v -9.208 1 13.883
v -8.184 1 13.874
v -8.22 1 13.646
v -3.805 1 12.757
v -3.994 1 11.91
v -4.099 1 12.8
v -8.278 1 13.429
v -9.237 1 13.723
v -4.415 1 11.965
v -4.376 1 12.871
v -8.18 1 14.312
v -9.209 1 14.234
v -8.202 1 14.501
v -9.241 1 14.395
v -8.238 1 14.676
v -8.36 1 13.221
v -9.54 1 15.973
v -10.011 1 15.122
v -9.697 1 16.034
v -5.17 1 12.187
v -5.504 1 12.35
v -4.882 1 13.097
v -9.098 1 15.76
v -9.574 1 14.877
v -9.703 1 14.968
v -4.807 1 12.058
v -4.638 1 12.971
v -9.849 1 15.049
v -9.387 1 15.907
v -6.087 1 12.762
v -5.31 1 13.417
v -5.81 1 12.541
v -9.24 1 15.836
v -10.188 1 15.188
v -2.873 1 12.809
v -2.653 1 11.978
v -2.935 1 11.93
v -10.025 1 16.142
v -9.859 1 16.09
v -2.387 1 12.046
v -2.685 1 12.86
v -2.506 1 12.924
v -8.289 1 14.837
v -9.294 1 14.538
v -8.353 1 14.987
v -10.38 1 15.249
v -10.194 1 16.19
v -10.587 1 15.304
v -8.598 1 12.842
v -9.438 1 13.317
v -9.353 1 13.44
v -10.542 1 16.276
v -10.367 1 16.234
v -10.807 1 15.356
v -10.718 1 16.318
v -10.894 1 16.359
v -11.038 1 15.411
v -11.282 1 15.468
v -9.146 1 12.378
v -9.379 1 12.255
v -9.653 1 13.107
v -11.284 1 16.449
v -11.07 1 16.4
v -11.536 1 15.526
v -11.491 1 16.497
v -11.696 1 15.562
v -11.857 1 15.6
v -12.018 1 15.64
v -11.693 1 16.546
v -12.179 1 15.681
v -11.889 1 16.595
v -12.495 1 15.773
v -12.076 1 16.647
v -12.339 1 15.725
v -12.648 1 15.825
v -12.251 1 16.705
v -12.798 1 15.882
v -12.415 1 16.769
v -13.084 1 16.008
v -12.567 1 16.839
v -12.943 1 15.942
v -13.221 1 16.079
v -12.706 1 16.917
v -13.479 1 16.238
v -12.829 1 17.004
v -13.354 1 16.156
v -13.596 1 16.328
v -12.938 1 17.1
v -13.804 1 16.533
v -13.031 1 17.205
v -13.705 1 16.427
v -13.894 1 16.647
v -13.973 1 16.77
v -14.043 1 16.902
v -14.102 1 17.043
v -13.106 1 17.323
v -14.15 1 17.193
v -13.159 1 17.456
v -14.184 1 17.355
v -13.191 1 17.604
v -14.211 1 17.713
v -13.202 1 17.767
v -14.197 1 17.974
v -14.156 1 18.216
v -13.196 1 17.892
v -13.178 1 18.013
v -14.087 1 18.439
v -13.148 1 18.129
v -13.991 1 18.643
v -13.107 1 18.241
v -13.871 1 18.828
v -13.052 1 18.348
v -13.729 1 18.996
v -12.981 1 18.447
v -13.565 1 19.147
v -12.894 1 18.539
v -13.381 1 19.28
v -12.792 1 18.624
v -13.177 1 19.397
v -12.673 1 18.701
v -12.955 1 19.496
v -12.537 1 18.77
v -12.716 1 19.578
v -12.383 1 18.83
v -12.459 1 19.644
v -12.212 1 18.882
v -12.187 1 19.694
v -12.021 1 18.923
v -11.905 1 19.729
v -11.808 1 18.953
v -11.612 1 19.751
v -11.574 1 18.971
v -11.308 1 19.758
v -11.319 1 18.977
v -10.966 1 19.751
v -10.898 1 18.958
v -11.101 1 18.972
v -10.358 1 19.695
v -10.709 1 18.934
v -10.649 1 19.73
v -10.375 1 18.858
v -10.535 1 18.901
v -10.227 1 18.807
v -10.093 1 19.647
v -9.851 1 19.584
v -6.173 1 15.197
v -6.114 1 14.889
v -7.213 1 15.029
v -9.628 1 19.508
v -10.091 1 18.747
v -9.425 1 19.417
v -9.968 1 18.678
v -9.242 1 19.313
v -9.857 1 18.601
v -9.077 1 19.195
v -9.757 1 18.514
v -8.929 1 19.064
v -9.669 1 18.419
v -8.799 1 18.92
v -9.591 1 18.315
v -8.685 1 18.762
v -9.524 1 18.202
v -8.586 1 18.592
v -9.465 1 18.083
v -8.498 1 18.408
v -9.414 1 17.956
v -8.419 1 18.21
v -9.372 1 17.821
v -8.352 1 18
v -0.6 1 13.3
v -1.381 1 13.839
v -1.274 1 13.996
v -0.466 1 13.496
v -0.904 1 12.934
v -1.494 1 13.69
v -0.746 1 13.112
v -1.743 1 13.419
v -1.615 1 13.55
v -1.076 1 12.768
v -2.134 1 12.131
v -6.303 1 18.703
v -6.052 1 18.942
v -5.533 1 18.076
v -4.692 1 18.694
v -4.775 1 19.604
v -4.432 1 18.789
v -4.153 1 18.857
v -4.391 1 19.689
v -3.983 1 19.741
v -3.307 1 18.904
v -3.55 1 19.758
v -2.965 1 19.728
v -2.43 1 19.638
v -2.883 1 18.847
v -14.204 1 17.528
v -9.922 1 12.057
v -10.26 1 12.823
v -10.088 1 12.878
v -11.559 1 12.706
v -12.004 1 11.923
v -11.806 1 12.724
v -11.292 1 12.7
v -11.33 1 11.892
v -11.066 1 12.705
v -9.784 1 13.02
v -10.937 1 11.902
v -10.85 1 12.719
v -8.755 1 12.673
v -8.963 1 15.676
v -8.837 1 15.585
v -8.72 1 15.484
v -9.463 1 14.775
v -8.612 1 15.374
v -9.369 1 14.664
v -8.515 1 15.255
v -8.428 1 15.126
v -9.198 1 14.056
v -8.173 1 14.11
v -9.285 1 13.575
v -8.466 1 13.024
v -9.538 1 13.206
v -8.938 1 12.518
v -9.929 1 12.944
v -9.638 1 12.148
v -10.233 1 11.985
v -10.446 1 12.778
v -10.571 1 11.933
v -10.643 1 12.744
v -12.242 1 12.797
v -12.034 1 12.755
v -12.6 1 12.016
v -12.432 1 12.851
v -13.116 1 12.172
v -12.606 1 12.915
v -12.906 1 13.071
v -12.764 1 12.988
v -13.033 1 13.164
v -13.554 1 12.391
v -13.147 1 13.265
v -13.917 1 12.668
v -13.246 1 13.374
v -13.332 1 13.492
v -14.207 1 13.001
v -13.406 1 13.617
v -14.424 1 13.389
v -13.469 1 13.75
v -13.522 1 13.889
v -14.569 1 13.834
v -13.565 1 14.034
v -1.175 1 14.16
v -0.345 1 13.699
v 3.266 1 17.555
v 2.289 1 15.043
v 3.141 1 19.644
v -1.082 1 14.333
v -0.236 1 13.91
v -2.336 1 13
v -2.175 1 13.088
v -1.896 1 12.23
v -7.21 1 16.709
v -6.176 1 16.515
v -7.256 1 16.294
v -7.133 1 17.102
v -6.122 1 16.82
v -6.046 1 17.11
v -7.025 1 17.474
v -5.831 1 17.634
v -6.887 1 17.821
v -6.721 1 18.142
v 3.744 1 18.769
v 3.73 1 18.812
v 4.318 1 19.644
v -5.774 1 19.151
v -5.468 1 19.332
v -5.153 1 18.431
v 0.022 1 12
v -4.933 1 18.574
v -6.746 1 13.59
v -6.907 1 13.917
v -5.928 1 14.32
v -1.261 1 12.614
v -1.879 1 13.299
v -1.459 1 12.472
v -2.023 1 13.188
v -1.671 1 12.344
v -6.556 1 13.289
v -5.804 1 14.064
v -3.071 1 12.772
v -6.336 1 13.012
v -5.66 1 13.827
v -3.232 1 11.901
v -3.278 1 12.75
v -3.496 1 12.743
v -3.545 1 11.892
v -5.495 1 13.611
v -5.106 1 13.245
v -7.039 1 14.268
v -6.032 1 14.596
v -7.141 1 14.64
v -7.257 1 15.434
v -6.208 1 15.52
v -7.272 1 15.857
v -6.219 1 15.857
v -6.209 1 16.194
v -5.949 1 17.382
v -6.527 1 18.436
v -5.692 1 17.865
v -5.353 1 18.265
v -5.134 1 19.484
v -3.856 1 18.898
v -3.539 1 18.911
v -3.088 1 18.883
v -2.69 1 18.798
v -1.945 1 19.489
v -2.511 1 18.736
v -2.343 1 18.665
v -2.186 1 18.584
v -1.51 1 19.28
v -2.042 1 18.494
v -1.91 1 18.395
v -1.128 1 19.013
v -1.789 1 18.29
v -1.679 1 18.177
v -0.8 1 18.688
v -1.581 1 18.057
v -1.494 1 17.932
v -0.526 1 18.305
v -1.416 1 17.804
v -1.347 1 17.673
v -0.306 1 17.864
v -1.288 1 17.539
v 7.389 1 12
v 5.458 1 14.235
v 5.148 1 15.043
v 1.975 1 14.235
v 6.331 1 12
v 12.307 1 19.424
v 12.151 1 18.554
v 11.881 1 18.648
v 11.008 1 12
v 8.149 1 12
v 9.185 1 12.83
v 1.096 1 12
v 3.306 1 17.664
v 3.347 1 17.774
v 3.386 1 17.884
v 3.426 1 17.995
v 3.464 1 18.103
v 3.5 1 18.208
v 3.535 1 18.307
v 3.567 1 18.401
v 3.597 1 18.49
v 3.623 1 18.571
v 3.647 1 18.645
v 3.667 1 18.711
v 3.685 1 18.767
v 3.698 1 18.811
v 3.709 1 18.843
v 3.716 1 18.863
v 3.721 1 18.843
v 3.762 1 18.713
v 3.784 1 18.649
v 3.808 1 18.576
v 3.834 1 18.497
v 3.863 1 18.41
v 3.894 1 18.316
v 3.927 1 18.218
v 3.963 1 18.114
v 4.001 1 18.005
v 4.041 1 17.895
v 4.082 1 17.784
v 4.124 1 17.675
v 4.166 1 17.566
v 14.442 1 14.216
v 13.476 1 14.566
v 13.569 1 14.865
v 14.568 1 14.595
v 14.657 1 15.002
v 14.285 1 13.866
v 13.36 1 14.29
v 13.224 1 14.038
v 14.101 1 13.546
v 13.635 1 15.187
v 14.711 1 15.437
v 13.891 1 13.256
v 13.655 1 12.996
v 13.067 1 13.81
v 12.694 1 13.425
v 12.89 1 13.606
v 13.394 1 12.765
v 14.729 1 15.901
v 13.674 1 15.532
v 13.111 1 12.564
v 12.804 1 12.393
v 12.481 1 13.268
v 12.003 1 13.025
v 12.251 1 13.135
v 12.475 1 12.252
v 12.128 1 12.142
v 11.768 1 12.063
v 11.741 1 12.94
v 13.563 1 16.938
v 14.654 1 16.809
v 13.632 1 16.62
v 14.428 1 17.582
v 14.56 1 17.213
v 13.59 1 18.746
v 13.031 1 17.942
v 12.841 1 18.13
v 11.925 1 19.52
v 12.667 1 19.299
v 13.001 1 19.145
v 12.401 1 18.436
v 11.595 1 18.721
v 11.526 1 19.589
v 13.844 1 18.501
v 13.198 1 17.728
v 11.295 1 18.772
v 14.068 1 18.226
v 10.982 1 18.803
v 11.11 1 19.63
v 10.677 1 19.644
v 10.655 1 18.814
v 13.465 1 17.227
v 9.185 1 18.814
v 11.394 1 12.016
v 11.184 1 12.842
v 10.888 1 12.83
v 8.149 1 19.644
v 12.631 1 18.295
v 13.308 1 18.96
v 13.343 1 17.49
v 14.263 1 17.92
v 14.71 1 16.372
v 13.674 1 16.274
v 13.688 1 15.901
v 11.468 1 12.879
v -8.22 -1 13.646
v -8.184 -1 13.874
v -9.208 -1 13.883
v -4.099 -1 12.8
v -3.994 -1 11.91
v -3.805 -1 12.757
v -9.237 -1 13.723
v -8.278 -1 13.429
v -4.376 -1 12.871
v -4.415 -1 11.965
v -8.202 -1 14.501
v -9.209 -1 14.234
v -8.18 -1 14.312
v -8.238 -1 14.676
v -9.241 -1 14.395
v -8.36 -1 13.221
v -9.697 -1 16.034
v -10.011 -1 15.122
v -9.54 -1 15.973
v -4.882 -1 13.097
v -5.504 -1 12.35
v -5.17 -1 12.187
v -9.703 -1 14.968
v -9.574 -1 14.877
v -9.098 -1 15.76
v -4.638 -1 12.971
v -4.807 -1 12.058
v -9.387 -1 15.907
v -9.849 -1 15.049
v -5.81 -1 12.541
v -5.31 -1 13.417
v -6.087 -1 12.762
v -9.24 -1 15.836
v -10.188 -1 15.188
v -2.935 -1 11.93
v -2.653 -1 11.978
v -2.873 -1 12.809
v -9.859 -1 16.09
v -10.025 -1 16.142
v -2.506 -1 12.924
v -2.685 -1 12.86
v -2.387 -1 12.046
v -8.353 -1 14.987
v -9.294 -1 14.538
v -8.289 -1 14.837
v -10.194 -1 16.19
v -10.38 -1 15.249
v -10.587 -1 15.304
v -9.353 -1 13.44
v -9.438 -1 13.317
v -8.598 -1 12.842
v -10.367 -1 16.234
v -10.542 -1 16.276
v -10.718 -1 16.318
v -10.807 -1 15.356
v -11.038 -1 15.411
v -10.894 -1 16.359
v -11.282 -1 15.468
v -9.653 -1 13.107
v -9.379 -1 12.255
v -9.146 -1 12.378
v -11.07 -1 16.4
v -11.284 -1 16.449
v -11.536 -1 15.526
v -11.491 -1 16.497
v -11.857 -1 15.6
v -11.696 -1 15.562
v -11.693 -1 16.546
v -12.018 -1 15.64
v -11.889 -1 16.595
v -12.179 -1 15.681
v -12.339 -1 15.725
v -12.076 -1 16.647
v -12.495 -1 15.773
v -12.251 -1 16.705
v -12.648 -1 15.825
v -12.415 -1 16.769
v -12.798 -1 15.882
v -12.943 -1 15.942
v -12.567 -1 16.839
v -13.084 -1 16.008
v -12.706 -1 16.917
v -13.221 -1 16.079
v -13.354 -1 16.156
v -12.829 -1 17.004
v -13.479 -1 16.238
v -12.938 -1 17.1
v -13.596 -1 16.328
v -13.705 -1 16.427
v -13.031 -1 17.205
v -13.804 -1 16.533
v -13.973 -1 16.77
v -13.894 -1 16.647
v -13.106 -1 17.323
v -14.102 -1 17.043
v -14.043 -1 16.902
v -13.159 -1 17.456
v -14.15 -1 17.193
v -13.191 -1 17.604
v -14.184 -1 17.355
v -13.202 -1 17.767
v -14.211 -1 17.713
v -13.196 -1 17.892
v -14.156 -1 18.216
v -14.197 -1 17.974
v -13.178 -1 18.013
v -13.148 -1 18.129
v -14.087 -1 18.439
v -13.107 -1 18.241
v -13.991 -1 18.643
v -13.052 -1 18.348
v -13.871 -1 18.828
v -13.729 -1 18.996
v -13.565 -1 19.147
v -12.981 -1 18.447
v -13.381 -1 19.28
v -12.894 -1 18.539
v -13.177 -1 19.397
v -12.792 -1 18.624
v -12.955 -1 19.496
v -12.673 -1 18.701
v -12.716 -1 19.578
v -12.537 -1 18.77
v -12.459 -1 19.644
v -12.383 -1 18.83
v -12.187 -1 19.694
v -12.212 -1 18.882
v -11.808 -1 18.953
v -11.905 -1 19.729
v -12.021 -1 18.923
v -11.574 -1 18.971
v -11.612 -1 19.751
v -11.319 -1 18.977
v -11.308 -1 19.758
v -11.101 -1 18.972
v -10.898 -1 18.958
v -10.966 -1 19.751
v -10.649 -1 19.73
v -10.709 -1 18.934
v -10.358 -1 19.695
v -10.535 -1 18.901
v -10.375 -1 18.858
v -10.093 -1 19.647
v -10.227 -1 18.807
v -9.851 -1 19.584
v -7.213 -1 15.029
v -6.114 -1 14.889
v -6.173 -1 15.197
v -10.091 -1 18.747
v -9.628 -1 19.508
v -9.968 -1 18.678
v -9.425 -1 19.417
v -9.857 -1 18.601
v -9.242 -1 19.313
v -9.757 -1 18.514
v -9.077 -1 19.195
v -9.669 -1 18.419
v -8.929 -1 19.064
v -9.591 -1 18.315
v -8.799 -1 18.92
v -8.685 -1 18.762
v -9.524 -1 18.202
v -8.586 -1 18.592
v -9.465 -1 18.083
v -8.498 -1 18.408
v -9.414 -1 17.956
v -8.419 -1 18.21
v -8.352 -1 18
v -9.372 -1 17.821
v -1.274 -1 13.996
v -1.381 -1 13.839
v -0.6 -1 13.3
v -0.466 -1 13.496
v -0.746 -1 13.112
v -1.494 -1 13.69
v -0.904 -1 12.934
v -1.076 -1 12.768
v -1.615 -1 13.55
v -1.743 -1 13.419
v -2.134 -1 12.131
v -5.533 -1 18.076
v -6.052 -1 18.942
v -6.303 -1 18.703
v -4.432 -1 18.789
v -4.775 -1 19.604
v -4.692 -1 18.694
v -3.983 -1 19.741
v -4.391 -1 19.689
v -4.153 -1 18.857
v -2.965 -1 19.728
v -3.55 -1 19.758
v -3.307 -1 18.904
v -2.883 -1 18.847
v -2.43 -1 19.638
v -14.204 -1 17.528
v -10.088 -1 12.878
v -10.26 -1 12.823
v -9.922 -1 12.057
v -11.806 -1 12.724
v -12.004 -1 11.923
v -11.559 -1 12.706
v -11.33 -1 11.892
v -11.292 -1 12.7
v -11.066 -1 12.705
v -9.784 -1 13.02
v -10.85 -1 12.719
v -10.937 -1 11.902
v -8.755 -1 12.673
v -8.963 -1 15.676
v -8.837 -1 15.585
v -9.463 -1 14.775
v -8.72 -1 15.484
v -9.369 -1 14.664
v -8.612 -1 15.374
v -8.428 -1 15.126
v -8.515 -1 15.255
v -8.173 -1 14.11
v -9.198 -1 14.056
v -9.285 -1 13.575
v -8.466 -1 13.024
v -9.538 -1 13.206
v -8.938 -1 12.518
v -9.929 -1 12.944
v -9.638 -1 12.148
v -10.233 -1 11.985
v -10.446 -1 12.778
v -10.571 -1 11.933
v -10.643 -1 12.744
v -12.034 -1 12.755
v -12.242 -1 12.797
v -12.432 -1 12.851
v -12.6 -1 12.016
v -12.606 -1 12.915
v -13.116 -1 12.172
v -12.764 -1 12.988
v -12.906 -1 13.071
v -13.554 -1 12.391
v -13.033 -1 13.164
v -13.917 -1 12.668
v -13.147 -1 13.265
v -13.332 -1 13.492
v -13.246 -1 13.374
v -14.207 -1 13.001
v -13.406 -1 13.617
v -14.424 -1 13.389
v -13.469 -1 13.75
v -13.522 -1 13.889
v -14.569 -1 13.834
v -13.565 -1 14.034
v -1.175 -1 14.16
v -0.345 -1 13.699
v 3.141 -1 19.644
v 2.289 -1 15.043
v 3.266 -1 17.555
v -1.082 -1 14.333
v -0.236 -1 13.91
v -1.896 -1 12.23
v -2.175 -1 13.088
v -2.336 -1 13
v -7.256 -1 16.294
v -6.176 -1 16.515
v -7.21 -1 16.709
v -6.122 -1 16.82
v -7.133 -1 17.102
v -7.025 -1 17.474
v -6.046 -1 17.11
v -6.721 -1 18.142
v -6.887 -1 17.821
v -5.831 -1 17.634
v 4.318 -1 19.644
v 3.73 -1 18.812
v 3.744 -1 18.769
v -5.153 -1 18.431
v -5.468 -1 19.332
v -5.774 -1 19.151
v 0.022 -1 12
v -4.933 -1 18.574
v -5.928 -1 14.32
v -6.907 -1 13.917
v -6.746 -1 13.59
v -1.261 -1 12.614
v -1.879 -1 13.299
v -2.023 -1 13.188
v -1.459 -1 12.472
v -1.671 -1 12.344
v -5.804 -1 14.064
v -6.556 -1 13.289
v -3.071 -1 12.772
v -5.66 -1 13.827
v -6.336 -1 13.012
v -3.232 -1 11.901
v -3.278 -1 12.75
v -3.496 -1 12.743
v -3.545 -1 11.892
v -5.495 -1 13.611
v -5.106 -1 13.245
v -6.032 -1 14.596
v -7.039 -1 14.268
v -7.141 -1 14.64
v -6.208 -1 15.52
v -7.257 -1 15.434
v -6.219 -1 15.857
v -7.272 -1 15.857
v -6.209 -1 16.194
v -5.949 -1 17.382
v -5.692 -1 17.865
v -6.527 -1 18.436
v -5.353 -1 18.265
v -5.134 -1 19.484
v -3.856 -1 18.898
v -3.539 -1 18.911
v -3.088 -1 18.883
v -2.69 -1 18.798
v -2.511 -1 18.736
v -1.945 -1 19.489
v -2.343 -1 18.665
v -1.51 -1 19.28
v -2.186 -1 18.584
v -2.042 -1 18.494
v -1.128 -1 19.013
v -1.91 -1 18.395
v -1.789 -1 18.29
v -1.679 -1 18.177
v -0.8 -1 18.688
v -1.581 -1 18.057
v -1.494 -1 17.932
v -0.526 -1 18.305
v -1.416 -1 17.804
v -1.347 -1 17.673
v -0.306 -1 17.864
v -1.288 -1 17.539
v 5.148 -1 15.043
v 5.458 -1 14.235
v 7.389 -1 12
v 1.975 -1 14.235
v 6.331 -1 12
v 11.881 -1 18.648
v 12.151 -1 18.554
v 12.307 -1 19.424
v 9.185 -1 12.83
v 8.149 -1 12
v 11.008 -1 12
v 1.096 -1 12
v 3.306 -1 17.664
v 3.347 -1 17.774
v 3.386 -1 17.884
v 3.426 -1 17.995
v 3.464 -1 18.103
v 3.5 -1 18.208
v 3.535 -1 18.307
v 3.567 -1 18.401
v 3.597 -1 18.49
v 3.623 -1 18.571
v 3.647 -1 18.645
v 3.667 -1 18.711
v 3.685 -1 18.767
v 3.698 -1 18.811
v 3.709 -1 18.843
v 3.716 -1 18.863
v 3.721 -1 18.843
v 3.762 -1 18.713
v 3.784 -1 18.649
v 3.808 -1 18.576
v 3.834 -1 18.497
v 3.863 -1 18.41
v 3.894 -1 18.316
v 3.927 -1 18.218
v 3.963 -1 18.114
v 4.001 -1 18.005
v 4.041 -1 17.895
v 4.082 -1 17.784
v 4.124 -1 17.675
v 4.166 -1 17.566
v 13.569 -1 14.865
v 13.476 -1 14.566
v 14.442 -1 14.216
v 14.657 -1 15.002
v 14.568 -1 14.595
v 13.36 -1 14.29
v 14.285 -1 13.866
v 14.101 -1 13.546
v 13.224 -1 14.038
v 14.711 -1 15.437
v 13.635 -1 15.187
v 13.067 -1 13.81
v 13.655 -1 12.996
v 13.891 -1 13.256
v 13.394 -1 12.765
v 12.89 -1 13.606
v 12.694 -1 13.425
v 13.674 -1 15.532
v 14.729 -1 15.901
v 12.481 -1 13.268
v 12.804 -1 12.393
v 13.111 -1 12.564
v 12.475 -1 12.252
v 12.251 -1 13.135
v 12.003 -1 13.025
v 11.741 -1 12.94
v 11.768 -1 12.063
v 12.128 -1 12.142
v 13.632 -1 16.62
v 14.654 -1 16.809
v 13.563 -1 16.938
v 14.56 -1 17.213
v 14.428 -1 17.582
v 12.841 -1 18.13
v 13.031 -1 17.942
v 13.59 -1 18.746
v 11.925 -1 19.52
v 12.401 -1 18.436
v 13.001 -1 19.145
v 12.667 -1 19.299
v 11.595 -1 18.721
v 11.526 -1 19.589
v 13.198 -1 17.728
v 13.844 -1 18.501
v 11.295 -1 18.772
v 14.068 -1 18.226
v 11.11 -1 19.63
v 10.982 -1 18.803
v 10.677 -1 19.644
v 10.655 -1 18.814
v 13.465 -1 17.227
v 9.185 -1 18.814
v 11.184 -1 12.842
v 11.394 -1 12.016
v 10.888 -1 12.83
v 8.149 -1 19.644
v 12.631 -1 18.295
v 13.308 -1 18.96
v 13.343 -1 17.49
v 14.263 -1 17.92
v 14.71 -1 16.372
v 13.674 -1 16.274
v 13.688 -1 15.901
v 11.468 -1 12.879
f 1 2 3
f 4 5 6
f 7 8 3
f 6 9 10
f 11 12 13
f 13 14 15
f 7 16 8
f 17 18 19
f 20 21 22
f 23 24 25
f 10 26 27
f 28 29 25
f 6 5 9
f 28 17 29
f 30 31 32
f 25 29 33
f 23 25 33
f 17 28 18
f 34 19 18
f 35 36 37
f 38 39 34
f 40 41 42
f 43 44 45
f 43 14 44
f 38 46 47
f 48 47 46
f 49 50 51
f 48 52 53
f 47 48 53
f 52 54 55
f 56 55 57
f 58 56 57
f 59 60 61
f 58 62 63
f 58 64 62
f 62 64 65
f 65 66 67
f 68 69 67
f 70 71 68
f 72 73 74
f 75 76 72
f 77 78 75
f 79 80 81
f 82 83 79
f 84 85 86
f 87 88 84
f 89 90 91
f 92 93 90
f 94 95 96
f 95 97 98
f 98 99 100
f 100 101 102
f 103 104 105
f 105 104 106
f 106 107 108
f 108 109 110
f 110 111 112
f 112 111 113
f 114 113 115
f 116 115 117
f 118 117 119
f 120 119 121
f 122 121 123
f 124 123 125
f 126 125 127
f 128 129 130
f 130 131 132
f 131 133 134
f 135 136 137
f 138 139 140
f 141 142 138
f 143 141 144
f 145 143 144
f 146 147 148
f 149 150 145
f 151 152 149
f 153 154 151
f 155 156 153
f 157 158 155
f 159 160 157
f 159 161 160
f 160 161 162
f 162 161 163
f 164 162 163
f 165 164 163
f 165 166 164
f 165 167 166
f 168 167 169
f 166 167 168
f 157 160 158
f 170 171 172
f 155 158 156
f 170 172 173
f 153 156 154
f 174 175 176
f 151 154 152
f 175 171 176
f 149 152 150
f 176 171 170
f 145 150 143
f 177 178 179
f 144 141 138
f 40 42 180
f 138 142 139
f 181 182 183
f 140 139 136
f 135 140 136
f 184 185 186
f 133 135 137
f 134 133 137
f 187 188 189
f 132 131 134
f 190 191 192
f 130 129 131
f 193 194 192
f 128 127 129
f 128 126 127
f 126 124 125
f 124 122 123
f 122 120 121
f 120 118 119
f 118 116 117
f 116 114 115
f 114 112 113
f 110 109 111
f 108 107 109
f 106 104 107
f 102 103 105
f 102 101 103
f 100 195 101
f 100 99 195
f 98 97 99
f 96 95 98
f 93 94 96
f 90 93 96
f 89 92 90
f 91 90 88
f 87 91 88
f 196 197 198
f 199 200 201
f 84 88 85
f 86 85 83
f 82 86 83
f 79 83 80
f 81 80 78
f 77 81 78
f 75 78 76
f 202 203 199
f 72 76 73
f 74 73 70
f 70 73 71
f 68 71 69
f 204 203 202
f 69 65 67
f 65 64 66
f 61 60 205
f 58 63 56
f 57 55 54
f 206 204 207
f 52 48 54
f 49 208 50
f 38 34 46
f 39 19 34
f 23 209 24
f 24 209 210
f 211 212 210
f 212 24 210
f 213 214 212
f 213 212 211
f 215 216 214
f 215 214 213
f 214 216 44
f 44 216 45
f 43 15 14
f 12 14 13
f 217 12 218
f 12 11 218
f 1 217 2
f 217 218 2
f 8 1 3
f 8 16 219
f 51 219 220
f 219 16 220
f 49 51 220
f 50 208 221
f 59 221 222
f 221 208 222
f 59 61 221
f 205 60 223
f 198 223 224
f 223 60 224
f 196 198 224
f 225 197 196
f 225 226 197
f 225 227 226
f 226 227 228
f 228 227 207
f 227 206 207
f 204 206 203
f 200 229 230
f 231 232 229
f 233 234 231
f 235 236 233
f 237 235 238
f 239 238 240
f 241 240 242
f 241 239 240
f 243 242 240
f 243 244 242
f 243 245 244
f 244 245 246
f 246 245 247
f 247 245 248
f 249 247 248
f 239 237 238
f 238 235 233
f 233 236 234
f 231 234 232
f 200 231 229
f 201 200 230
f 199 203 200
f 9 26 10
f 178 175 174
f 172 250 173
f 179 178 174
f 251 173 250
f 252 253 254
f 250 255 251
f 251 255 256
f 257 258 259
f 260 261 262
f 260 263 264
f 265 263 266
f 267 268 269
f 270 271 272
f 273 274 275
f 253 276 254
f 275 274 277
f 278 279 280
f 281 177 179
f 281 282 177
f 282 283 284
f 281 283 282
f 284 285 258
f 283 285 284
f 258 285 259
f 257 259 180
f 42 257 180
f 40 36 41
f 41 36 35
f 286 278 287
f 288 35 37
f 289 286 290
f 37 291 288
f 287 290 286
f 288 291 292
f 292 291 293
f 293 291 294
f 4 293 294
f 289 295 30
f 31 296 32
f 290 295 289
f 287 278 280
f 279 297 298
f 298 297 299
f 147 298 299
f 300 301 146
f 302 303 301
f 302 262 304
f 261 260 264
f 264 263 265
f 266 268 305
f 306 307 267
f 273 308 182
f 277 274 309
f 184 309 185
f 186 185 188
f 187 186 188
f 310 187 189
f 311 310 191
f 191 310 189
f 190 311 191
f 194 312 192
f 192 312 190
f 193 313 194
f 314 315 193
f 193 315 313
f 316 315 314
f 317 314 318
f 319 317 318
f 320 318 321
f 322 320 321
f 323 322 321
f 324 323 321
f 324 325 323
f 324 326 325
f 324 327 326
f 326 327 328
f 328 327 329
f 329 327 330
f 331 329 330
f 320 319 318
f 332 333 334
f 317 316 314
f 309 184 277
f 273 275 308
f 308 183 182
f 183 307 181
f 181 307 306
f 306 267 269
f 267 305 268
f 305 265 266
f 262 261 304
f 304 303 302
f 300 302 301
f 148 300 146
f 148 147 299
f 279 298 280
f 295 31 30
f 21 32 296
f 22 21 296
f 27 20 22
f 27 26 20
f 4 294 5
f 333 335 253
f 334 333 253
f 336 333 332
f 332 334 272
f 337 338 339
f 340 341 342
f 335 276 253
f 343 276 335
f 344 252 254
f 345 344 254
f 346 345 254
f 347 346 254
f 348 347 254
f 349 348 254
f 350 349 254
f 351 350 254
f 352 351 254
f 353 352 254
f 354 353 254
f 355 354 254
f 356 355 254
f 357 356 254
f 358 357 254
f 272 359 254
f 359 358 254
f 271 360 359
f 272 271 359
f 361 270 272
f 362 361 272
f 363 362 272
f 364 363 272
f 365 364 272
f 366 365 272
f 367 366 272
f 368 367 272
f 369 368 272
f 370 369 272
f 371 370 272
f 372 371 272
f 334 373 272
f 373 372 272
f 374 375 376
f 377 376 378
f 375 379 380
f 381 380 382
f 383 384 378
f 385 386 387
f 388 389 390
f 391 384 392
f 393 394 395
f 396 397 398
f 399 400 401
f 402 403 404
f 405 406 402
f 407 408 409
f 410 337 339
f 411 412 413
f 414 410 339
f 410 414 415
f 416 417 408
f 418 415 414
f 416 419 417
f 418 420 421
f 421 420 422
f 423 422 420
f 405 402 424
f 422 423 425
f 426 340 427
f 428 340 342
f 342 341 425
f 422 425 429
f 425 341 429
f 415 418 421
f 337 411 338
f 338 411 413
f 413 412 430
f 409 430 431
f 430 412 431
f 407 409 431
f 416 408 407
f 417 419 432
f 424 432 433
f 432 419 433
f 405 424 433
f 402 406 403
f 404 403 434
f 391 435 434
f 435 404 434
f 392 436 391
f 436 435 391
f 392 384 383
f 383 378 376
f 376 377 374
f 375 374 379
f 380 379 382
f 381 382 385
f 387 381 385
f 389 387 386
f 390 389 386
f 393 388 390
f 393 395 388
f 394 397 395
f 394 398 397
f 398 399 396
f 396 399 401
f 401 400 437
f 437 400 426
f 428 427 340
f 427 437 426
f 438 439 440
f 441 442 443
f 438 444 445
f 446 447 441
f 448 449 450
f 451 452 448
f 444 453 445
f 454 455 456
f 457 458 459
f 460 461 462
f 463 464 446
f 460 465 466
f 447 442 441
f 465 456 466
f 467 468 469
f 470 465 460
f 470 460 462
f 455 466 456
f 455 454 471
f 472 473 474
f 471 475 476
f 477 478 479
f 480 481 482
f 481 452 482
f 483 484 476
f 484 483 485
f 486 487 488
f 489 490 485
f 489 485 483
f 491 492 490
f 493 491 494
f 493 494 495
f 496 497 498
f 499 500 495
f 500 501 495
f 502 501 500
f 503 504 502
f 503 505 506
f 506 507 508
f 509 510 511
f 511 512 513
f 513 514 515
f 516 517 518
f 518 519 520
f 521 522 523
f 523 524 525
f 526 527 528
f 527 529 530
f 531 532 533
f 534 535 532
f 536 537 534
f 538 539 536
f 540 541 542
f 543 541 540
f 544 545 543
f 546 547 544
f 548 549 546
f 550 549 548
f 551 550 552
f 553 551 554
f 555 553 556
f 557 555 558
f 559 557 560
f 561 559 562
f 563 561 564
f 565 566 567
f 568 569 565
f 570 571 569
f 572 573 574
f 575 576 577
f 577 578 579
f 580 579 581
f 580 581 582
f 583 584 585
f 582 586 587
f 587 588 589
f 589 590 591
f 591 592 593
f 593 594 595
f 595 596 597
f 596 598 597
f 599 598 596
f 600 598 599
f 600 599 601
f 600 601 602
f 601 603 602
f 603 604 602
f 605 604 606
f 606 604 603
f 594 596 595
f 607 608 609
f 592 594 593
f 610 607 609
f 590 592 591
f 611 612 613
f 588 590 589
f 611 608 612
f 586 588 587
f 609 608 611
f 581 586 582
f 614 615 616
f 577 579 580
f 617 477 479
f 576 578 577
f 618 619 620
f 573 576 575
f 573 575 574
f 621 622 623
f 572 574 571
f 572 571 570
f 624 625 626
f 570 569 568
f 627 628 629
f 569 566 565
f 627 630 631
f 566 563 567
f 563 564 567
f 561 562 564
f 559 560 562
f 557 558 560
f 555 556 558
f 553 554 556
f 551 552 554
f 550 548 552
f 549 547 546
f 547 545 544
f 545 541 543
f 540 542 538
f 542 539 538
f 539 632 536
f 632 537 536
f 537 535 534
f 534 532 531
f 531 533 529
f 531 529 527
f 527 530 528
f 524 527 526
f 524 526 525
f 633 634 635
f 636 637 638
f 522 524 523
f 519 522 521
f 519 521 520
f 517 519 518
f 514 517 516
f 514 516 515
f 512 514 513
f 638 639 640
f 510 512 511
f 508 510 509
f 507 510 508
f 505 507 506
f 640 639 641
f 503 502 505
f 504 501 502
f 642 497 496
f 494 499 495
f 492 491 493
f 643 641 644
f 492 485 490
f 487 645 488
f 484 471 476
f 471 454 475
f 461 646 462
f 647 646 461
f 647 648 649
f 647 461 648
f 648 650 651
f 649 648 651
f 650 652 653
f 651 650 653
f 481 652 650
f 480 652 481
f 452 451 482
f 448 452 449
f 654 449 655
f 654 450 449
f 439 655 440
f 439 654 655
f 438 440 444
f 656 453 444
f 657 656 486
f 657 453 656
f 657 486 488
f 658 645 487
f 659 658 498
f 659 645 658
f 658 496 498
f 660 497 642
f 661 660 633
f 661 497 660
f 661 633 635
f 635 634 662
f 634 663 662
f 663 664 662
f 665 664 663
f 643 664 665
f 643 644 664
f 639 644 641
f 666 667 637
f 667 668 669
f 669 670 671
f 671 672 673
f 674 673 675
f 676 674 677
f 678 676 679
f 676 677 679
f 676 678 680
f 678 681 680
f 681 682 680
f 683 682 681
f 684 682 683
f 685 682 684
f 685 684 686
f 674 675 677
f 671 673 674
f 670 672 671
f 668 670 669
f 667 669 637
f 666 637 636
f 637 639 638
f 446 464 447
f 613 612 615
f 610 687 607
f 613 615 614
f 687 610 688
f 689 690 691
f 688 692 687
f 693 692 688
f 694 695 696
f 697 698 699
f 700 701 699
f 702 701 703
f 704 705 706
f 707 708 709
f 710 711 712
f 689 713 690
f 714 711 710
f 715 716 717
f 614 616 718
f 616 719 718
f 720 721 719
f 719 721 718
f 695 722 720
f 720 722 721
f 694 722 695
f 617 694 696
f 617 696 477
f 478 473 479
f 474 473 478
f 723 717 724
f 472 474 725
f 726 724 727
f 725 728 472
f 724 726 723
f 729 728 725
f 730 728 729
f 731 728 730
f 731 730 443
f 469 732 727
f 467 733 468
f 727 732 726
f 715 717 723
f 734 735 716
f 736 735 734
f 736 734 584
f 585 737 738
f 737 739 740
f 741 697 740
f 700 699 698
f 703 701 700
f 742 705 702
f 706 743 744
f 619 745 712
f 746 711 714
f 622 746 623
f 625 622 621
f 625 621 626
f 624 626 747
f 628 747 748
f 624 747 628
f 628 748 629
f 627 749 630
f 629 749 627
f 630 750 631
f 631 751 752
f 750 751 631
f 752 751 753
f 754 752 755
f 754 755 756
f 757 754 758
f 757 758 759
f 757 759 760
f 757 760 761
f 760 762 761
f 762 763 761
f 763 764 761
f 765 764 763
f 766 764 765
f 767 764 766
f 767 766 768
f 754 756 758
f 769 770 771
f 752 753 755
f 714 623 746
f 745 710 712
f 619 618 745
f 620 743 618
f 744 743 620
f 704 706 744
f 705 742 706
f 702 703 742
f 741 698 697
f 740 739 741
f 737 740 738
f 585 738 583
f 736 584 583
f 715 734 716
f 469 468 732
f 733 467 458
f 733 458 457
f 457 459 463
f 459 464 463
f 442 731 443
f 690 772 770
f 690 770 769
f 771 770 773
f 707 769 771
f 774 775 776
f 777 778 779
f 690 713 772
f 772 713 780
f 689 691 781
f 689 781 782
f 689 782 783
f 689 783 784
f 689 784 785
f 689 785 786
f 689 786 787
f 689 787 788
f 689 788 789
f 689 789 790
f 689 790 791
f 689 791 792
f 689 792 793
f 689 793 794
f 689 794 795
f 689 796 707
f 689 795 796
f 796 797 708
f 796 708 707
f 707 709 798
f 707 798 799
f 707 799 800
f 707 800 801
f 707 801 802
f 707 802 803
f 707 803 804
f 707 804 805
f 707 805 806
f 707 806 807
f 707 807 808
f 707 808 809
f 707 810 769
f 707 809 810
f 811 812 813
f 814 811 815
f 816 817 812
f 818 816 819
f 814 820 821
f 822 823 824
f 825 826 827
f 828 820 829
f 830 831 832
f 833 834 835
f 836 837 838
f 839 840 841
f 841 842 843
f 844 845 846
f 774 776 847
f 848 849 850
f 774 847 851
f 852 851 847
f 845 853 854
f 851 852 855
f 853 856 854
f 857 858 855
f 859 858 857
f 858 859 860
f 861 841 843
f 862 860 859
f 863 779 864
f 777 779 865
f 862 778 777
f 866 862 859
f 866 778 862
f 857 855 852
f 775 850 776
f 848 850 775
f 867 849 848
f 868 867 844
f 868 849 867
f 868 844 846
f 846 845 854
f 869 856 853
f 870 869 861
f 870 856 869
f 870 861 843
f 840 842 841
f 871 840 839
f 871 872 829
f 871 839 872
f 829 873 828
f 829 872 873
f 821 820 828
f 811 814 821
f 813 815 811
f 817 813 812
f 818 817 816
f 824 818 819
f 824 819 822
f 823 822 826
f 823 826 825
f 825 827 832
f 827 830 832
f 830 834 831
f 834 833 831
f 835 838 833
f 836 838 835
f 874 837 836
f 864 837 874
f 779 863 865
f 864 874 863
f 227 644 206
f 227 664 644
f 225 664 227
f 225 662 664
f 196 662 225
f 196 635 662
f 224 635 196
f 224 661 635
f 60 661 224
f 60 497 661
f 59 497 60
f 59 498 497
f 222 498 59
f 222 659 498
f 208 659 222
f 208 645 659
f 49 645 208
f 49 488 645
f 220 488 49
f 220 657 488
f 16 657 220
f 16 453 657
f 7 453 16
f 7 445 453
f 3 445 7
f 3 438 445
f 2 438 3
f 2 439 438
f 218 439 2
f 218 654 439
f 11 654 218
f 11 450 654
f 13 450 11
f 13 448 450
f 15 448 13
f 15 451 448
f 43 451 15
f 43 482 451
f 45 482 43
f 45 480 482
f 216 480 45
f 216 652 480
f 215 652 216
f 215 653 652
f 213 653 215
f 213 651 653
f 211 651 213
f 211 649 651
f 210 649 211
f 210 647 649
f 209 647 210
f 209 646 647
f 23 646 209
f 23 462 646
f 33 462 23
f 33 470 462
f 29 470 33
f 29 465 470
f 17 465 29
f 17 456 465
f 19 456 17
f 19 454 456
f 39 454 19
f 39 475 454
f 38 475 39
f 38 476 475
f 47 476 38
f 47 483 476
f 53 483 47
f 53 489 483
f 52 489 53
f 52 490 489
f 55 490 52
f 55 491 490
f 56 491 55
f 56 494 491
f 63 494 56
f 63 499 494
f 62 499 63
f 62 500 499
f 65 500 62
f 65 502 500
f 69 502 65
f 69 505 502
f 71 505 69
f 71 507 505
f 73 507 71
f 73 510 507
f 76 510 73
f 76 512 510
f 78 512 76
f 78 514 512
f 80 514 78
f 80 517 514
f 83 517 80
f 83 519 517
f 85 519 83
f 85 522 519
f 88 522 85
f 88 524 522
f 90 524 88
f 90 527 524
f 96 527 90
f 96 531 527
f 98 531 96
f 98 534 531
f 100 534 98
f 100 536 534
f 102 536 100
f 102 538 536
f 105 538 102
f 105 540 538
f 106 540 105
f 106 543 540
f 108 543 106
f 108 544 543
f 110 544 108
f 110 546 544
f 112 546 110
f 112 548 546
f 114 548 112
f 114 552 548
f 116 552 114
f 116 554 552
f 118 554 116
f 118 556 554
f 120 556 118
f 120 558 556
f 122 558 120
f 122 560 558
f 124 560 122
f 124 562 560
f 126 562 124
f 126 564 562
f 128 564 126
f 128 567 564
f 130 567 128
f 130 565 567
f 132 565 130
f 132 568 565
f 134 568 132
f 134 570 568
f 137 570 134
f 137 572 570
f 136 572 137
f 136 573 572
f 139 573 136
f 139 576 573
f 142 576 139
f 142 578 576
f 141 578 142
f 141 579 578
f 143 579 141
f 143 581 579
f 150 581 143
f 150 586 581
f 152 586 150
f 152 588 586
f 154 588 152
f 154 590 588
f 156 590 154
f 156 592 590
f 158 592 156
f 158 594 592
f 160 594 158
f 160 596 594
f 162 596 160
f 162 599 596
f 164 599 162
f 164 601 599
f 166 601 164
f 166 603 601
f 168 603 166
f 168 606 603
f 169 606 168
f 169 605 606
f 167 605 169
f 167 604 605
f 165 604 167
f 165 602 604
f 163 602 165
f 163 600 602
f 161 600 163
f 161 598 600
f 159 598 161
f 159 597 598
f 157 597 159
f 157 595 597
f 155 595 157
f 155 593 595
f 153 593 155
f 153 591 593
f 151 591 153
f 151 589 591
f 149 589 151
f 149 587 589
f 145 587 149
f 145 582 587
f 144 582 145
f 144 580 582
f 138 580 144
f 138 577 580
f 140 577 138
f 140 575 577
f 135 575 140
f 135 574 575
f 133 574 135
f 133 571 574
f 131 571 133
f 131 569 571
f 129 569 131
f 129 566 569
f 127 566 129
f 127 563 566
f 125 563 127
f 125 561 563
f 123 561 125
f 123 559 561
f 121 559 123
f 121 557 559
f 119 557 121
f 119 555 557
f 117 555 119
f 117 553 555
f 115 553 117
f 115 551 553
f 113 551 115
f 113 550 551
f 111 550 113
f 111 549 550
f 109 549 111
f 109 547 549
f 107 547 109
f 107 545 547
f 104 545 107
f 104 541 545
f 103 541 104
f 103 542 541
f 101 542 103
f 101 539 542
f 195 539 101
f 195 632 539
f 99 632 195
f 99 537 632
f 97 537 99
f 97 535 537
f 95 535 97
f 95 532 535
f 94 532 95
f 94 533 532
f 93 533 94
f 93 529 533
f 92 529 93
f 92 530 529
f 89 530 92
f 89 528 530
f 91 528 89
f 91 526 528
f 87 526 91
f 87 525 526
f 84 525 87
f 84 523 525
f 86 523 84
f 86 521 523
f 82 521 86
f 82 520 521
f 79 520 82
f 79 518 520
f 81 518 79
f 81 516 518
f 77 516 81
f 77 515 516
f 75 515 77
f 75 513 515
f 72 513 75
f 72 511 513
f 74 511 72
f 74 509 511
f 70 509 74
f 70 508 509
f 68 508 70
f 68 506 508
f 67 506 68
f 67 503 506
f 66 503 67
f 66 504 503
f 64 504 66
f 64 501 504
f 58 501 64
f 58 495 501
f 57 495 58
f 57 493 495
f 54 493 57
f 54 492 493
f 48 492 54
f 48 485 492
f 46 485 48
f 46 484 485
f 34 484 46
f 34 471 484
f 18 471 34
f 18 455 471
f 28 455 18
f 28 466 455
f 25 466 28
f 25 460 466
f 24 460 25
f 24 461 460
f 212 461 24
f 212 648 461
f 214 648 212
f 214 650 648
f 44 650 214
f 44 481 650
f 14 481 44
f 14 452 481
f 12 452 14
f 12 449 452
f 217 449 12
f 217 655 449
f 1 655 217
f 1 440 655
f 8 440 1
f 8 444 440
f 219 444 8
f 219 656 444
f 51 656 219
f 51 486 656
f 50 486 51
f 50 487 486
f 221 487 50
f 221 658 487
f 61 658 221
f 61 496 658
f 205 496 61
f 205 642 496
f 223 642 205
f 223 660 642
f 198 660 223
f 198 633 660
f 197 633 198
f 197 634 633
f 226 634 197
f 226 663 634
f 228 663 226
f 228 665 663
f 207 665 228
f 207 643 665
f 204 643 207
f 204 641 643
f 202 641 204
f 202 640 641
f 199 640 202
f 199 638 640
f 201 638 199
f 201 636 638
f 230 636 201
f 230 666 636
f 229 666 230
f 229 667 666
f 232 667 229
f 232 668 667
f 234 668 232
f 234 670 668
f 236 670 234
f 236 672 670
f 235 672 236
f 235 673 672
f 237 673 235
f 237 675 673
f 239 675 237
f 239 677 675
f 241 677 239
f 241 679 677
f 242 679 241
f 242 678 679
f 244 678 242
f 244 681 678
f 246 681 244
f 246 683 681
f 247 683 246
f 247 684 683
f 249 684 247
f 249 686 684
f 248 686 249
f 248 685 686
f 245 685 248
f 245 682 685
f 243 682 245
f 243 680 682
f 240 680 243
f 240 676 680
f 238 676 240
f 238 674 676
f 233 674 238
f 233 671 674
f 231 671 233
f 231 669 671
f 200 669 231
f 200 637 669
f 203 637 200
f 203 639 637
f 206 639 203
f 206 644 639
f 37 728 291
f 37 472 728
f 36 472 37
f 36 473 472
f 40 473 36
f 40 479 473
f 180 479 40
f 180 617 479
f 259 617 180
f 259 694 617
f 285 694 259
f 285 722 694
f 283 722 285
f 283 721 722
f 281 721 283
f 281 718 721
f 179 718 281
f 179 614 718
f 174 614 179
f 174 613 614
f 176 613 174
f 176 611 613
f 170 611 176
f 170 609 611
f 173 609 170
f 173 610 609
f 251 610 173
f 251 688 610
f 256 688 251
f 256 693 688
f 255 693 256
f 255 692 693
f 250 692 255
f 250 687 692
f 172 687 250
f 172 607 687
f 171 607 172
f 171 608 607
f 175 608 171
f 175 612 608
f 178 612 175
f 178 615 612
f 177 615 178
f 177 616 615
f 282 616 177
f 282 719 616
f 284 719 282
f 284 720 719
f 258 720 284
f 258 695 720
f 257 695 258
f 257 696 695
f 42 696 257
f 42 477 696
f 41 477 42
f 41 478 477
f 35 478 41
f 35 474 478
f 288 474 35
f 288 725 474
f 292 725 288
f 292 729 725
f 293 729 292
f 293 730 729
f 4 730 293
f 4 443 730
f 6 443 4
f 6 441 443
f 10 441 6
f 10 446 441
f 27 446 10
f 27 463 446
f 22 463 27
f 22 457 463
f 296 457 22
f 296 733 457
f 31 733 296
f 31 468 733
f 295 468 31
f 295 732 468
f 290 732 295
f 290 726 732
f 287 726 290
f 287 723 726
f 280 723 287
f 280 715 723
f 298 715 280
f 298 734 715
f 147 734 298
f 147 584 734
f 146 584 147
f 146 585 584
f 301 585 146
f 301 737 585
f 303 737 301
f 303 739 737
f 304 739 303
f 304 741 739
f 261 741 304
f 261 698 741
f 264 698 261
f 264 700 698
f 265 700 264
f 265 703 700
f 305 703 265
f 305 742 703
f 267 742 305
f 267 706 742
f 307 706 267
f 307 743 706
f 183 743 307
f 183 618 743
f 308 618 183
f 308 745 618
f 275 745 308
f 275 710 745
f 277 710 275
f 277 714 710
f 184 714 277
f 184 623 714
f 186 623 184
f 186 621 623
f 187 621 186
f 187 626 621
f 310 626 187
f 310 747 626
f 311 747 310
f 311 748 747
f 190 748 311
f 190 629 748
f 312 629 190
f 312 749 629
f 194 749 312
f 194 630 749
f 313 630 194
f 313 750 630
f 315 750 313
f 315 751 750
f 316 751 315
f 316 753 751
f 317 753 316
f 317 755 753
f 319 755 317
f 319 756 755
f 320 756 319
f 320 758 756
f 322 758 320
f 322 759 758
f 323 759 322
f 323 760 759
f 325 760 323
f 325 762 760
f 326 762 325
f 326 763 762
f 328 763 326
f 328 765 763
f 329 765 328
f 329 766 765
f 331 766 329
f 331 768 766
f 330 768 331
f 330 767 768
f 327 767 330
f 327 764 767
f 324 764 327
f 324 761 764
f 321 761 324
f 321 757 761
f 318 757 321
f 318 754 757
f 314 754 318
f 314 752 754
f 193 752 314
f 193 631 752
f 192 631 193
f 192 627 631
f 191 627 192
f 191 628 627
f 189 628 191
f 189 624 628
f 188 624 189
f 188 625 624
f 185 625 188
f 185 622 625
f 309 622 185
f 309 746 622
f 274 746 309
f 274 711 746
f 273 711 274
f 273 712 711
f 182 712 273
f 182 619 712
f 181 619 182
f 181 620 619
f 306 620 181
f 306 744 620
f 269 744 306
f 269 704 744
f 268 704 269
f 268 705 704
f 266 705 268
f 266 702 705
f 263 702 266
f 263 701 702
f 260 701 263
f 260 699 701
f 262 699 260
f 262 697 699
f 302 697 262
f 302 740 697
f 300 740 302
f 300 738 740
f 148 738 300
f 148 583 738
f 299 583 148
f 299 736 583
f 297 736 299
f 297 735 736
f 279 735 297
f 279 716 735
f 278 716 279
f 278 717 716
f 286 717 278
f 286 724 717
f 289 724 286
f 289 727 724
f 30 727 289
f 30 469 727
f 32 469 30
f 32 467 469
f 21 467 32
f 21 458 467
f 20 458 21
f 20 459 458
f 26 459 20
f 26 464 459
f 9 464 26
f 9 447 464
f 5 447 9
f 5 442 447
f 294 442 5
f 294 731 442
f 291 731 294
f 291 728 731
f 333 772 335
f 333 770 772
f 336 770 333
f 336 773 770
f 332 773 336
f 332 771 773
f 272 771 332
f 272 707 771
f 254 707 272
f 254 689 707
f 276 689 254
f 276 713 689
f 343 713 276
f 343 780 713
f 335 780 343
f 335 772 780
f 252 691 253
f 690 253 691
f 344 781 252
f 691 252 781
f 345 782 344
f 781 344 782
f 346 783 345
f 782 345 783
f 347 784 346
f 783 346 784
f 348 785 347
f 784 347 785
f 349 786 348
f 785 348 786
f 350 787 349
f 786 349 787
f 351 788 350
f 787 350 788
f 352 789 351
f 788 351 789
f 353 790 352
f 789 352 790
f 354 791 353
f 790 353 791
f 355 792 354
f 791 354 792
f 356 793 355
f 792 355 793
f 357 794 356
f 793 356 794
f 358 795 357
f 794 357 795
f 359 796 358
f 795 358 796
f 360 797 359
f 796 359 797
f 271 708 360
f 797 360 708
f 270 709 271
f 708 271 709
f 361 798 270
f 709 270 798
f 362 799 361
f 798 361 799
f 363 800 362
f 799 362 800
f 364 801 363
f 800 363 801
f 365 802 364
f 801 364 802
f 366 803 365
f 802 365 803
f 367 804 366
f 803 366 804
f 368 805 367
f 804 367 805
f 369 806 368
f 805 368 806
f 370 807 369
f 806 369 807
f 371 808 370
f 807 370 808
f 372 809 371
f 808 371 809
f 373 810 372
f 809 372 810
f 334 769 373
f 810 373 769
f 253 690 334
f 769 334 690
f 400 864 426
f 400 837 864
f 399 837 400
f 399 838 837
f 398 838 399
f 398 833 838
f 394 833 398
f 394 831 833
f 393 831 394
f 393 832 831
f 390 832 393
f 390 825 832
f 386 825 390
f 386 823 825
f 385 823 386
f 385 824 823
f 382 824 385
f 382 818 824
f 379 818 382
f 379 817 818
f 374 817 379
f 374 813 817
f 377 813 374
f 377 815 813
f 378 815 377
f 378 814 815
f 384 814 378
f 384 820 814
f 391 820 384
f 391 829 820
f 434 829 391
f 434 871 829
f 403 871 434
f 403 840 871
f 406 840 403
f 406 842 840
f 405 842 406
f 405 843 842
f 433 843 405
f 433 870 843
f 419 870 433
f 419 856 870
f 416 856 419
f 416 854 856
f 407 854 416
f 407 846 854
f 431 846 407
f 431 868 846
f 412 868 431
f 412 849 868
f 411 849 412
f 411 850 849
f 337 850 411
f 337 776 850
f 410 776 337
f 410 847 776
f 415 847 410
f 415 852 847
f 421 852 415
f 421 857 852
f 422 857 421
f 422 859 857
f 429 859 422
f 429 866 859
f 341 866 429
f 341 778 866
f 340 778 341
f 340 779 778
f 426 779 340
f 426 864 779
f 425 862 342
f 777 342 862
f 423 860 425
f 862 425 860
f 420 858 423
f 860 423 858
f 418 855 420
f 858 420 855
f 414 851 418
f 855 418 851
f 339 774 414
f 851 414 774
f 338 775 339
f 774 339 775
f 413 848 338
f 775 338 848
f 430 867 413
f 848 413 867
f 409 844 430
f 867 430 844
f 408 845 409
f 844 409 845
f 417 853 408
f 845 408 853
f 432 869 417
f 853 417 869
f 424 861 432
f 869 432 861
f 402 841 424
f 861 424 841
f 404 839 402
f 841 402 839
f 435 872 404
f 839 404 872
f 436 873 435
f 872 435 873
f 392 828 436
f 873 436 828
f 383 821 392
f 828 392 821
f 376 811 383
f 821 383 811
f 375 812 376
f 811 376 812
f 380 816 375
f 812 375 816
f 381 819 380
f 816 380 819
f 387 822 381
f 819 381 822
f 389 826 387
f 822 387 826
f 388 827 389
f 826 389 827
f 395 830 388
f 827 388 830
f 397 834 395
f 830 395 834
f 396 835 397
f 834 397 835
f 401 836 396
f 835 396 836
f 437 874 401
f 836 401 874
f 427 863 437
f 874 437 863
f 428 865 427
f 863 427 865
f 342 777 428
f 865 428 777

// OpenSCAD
// Volume: 148.48121946205185, SurfaceArea: 474.90620244106907
translate([0,0,12]) rotate([90,0,0])
    linear_extrude(height=2, center=true)
        text("SCAD", 8, halign="center");
